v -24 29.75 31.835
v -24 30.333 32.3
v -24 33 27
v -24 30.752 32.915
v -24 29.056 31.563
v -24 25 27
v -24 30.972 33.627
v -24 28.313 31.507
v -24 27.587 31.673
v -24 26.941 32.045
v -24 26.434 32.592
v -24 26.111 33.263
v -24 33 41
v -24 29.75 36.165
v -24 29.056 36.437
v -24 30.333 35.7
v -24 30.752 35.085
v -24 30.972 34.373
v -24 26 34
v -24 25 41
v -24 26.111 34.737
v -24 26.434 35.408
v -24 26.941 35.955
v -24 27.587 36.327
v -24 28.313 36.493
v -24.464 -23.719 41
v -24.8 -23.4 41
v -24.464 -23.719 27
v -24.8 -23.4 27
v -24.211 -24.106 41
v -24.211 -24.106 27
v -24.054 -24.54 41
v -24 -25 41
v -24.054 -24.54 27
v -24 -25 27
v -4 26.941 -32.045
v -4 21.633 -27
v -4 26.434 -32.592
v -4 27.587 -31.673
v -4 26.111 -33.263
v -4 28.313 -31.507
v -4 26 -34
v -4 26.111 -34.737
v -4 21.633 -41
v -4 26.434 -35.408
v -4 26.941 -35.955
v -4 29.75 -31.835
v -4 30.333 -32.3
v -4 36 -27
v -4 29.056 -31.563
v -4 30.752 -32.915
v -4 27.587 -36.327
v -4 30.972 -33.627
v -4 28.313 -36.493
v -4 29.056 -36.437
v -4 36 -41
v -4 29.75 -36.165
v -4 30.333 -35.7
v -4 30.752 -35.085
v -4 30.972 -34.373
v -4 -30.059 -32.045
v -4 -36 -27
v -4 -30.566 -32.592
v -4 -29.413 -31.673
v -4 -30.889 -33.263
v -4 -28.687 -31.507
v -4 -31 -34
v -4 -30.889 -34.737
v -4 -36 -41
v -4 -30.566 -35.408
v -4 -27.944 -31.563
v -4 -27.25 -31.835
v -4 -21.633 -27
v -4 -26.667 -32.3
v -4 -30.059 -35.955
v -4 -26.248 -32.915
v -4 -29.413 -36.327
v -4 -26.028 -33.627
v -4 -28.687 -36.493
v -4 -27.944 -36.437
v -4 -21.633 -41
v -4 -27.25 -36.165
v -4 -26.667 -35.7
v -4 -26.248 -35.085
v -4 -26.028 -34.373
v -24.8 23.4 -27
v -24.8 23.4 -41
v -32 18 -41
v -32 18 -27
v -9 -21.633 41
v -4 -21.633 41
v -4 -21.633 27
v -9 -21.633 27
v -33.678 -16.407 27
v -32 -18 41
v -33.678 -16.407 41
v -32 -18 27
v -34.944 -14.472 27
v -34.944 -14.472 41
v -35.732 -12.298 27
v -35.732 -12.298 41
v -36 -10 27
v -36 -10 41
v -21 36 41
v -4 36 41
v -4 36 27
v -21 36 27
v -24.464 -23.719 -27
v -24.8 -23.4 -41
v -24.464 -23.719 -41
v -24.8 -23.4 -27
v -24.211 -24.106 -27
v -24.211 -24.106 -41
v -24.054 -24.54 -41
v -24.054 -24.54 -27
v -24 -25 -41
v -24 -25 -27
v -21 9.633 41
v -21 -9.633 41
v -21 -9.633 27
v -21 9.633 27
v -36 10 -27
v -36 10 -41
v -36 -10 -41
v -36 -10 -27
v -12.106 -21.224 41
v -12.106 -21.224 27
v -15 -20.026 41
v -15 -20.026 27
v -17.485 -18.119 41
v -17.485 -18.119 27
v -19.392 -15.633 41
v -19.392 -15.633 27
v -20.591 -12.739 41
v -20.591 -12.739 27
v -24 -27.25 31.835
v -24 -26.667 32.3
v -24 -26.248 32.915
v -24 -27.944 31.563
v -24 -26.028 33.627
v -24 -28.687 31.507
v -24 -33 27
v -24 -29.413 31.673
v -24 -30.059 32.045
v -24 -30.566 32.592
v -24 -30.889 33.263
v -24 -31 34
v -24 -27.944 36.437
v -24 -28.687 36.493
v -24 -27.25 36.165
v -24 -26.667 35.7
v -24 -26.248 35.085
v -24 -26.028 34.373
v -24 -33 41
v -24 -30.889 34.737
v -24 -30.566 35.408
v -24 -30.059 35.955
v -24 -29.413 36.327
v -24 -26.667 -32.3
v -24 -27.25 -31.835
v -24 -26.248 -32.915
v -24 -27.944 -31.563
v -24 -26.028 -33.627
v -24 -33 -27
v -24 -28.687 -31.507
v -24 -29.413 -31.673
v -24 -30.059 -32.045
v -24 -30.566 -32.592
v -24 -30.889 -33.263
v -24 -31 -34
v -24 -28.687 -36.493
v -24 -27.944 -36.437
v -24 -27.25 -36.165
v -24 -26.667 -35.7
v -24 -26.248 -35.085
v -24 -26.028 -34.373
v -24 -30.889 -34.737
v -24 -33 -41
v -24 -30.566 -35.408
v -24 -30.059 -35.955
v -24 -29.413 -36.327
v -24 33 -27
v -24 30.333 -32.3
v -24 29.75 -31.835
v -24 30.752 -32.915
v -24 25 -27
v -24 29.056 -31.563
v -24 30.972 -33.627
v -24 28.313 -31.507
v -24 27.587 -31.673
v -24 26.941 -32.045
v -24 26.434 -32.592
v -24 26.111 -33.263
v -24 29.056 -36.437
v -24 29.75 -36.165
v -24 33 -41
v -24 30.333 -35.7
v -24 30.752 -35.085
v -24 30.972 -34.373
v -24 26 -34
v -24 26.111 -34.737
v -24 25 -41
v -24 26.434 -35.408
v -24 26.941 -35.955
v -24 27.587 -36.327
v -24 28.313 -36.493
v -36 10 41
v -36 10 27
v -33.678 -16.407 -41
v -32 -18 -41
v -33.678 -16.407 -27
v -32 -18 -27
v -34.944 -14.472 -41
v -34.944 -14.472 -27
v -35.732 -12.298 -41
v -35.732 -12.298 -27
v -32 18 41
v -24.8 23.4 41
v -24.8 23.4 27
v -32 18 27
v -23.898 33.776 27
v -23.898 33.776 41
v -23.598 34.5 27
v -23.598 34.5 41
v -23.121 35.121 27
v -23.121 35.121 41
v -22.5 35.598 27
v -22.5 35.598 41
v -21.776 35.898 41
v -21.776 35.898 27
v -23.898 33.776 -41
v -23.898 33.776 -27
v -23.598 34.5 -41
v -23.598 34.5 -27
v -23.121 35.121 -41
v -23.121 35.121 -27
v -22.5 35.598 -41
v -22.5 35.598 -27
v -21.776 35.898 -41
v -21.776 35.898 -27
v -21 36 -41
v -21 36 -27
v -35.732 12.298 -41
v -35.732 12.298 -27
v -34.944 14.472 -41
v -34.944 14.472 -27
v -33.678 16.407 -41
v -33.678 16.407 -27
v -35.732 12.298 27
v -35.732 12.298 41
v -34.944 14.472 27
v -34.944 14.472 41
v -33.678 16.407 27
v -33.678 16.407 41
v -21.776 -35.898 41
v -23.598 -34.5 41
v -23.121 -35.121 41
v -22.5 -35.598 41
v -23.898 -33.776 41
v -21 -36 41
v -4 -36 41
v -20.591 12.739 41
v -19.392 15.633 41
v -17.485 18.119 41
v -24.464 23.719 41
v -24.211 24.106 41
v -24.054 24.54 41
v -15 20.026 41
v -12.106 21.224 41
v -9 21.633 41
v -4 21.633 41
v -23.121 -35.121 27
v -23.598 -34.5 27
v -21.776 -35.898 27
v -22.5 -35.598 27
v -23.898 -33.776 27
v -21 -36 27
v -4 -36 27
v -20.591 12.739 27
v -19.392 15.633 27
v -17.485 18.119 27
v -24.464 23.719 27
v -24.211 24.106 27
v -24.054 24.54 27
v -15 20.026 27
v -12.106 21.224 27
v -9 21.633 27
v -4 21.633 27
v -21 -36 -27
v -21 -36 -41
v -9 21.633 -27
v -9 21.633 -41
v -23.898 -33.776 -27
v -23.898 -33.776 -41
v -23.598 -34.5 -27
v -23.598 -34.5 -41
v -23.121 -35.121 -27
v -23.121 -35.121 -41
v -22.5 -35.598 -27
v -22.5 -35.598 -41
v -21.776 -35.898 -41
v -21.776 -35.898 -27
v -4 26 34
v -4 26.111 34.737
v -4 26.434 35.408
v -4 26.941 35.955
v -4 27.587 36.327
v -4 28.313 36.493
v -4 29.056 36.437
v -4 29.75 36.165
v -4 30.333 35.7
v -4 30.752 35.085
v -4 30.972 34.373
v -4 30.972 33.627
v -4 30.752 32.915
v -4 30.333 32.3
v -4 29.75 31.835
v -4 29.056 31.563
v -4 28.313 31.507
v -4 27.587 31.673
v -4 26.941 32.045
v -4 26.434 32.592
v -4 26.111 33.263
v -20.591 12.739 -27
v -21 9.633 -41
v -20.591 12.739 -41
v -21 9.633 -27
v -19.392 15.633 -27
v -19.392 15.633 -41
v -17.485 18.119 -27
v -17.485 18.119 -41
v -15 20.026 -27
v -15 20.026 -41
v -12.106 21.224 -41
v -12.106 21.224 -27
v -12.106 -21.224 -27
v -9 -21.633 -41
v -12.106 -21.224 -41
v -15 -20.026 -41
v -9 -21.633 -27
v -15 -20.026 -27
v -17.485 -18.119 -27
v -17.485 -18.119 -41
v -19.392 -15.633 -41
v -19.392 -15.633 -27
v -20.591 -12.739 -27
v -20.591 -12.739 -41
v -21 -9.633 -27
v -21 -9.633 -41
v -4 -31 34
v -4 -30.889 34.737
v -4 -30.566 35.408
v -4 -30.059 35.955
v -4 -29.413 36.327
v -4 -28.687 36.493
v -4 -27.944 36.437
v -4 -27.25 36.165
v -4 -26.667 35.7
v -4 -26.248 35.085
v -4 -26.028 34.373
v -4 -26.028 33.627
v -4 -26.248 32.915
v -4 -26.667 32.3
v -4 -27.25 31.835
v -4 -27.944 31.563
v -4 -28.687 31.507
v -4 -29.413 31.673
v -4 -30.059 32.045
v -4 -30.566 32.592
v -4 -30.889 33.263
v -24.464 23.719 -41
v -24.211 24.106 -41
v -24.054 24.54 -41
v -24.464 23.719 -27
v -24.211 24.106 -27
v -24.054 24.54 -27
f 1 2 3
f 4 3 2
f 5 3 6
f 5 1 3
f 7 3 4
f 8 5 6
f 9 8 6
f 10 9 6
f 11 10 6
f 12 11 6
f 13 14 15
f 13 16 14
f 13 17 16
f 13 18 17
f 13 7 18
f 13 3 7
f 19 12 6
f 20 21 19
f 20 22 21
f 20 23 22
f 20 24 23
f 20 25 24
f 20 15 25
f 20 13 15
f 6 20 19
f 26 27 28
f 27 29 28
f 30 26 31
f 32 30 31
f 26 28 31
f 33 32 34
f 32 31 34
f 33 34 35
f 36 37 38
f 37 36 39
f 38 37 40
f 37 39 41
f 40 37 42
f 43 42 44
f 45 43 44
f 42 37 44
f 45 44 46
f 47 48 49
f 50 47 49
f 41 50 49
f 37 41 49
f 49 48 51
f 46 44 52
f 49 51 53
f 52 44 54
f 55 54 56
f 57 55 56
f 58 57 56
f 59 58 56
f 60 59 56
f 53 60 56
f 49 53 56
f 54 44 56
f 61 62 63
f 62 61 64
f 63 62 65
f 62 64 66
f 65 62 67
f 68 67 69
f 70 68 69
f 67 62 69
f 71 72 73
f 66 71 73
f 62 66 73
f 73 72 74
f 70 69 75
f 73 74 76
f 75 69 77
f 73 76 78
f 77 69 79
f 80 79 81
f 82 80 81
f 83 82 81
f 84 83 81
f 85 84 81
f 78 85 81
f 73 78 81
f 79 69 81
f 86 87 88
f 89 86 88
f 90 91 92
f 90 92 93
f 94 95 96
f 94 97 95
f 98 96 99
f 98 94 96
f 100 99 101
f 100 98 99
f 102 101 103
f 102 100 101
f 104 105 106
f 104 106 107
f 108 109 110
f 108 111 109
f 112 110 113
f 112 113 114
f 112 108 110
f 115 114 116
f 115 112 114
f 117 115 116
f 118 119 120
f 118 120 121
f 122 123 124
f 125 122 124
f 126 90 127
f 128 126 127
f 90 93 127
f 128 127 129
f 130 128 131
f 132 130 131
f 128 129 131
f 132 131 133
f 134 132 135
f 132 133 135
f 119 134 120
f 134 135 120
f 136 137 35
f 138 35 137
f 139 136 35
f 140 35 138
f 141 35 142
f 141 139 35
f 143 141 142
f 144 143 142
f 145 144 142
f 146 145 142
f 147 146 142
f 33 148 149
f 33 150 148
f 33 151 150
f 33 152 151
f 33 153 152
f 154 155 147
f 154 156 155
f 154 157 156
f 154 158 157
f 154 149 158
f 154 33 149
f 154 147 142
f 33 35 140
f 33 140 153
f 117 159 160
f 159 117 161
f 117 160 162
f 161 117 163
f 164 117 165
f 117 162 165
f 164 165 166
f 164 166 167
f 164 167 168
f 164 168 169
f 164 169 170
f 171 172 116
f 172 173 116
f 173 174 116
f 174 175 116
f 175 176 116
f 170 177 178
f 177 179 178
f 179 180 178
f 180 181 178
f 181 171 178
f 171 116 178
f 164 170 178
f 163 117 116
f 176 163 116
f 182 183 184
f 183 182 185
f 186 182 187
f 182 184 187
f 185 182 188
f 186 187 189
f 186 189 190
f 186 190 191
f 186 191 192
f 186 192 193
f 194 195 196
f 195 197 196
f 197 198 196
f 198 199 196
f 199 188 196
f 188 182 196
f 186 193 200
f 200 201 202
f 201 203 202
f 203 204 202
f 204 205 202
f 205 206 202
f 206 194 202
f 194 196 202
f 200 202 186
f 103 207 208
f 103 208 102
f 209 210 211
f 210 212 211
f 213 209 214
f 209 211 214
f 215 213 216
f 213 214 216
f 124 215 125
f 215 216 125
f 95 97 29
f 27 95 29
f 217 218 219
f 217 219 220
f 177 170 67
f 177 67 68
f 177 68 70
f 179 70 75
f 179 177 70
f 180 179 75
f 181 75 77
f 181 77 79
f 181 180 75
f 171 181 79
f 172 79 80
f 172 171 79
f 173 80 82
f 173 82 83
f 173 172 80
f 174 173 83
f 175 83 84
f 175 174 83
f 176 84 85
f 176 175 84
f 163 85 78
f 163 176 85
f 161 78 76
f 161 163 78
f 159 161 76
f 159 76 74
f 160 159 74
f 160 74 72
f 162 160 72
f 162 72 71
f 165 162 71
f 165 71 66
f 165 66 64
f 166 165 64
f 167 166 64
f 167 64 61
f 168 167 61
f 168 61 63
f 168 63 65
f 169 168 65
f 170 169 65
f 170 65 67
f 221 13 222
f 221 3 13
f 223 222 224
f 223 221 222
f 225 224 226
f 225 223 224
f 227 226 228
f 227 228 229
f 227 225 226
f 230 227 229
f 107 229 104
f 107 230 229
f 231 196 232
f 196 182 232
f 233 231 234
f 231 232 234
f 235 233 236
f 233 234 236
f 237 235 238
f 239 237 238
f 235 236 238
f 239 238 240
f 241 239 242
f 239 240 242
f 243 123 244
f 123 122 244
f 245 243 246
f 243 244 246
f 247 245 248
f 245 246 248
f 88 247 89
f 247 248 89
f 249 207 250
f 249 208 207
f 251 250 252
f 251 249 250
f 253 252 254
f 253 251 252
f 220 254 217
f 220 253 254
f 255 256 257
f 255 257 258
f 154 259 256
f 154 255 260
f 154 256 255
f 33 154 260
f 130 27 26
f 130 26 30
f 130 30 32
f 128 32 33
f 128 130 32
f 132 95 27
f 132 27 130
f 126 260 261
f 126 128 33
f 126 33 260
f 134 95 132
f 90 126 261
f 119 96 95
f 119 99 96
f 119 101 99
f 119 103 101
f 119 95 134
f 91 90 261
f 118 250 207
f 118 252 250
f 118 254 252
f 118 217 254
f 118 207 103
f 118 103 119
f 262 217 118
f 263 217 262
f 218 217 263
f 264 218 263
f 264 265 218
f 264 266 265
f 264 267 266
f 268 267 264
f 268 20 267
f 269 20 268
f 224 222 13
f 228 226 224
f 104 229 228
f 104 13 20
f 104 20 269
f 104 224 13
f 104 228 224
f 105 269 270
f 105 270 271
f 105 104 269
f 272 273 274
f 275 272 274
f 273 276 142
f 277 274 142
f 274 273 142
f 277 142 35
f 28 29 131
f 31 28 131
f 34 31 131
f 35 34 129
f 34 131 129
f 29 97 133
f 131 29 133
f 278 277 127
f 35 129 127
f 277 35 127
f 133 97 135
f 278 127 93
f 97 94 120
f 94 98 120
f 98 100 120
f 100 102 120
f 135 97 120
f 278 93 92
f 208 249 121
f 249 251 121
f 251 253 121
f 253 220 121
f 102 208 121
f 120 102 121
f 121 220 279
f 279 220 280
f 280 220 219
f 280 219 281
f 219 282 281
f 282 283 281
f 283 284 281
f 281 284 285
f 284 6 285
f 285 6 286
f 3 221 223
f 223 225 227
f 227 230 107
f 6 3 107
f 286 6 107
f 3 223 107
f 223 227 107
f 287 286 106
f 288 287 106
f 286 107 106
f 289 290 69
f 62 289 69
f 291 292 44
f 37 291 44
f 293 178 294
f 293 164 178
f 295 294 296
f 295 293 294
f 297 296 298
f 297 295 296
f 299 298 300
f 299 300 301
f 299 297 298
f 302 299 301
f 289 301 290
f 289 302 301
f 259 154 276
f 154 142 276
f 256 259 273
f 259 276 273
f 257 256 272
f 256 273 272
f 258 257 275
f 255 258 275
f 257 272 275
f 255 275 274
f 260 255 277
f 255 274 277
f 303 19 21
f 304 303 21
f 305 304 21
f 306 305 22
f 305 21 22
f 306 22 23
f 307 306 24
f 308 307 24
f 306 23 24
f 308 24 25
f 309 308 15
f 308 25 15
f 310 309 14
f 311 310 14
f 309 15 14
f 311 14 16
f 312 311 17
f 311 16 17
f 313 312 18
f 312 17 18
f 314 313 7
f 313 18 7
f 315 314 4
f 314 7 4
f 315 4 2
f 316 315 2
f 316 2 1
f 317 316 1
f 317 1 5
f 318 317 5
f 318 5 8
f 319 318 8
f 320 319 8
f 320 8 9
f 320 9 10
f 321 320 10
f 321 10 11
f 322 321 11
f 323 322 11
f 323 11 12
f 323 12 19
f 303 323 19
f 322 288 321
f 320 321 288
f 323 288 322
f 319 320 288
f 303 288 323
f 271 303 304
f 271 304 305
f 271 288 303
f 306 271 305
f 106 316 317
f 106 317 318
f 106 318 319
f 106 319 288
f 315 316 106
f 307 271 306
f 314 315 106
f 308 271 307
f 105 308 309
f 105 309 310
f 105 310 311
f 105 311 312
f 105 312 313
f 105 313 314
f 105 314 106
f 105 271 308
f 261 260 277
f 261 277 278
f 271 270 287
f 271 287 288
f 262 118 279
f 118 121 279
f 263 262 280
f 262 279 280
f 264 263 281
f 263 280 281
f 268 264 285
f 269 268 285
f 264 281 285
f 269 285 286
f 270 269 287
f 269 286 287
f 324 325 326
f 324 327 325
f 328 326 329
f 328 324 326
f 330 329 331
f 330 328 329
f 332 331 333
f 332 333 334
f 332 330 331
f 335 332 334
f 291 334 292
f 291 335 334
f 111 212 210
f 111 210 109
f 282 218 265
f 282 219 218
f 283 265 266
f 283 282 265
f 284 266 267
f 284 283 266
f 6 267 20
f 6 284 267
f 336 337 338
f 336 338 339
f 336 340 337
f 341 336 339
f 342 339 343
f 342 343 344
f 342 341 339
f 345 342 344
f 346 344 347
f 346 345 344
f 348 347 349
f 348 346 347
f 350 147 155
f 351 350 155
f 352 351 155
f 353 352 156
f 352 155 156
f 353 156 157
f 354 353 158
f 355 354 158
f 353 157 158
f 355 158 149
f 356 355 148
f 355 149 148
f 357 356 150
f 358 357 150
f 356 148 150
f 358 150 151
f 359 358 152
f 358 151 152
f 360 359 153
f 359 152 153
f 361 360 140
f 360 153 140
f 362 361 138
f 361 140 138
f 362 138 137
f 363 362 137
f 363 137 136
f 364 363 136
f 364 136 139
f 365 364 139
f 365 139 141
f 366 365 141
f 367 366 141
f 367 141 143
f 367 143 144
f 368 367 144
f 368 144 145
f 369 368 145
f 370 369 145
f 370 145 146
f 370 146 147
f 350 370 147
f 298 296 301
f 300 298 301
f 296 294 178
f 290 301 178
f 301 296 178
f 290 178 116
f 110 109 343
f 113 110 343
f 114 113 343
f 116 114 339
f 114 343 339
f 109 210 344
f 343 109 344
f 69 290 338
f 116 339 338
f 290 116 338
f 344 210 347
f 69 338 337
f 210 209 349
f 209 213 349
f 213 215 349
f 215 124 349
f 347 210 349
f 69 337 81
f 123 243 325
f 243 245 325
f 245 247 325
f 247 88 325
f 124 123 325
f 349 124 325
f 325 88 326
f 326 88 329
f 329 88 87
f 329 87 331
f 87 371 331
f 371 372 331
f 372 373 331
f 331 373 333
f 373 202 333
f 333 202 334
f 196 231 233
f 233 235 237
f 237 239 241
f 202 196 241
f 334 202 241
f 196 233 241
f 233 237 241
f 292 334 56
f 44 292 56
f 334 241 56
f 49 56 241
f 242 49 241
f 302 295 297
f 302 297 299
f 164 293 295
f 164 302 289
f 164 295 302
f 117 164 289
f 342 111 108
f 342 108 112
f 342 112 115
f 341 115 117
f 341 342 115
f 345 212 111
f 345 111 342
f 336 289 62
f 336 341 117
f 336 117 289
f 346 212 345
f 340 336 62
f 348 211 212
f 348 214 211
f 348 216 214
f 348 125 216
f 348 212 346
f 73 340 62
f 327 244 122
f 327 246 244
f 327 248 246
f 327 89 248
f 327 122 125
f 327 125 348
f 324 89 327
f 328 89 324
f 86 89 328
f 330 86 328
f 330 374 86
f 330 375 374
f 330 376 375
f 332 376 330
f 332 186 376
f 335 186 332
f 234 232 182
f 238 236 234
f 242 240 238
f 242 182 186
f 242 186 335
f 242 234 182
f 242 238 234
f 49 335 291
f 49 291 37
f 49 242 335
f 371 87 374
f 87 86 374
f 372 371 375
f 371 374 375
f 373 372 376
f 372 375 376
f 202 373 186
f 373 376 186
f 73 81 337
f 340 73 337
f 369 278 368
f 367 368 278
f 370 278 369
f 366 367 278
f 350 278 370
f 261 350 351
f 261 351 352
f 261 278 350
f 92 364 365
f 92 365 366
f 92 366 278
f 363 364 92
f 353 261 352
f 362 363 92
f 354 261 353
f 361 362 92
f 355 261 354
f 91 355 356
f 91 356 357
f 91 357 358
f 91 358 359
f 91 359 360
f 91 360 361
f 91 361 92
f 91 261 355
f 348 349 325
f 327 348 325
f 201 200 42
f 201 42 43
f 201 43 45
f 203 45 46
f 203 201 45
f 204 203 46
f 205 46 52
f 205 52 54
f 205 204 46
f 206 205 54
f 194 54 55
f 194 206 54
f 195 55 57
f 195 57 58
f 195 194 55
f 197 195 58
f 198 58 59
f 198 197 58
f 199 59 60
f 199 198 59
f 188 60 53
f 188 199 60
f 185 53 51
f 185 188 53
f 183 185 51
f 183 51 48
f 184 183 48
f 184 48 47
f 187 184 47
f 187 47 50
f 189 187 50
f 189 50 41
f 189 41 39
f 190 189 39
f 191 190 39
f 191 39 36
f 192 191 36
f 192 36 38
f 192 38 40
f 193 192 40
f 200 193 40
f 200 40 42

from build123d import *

# Parameters (mm, degrees)
PAD014_DEPTH    = 14
SKETCH015_R     = 2.5
POCKET005_DEPTH = 20.001
FILLET004_R     = 12
FILLET005_R     = 10
FILLET012_R     = 2
FILLET013_R     = 3


with BuildPart() as part:
    # Sketch014 (on Face10 of Binder003) → Pad014 (new body)
    with BuildSketch(Plane.XY.offset(41)):
        Polygon((-4, -36), (-4, -21.633308), (-21, -21.633308), (-21, 21.633308), (-4, 21.633308), (-4, 36), (-24, 36), (-24, 24), (-36, 15), (-36, -15), (-24, -24), (-24, -36), align=None)
    extrude(amount=-PAD014_DEPTH)

    # Sketch015 (on Face11 of Pad014) → Pocket005 (cut, through all)
    with BuildSketch(Plane(origin=(-24, 0, 0), x_dir=(0, -1, 0), z_dir=(-1, 0, 0))):
        with Locations((-28.5, 34)):
            Circle(SKETCH015_R)
        with Locations((28.5, 34)):
            Circle(SKETCH015_R)
    extrude(amount=-POCKET005_DEPTH, mode=Mode.SUBTRACT)

    # Fillet004
    fillet004_edges = [part.edges().sort_by_distance(p)[0] for p in [
        (-21, -21.633308, 34),
        (-21, 21.633308, 34),
    ]]
    fillet(fillet004_edges, radius=FILLET004_R)

    # Fillet005
    fillet005_edges = [part.edges().sort_by_distance(p)[0] for p in [
        (-36, -15, 34),
        (-36, 15, 34),
    ]]
    fillet(fillet005_edges, radius=FILLET005_R)

    # Fillet012
    fillet012_edges = [part.edges().sort_by_distance(p)[0] for p in [
        (-24, 24, 34),
        (-24, -24, 34),
    ]]
    fillet(fillet012_edges, radius=FILLET012_R)

    # Fillet013
    fillet013_edges = [part.edges().sort_by_distance(p)[0] for p in [
        (-24, 36, 34),
        (-24, -36, 34),
    ]]
    fillet(fillet013_edges, radius=FILLET013_R)

    # Mirrored001: part across XY


with BuildPart() as part_1:
    add(part.part)
    add(part.part.mirror(Plane.XY))


solid = part_1.part
